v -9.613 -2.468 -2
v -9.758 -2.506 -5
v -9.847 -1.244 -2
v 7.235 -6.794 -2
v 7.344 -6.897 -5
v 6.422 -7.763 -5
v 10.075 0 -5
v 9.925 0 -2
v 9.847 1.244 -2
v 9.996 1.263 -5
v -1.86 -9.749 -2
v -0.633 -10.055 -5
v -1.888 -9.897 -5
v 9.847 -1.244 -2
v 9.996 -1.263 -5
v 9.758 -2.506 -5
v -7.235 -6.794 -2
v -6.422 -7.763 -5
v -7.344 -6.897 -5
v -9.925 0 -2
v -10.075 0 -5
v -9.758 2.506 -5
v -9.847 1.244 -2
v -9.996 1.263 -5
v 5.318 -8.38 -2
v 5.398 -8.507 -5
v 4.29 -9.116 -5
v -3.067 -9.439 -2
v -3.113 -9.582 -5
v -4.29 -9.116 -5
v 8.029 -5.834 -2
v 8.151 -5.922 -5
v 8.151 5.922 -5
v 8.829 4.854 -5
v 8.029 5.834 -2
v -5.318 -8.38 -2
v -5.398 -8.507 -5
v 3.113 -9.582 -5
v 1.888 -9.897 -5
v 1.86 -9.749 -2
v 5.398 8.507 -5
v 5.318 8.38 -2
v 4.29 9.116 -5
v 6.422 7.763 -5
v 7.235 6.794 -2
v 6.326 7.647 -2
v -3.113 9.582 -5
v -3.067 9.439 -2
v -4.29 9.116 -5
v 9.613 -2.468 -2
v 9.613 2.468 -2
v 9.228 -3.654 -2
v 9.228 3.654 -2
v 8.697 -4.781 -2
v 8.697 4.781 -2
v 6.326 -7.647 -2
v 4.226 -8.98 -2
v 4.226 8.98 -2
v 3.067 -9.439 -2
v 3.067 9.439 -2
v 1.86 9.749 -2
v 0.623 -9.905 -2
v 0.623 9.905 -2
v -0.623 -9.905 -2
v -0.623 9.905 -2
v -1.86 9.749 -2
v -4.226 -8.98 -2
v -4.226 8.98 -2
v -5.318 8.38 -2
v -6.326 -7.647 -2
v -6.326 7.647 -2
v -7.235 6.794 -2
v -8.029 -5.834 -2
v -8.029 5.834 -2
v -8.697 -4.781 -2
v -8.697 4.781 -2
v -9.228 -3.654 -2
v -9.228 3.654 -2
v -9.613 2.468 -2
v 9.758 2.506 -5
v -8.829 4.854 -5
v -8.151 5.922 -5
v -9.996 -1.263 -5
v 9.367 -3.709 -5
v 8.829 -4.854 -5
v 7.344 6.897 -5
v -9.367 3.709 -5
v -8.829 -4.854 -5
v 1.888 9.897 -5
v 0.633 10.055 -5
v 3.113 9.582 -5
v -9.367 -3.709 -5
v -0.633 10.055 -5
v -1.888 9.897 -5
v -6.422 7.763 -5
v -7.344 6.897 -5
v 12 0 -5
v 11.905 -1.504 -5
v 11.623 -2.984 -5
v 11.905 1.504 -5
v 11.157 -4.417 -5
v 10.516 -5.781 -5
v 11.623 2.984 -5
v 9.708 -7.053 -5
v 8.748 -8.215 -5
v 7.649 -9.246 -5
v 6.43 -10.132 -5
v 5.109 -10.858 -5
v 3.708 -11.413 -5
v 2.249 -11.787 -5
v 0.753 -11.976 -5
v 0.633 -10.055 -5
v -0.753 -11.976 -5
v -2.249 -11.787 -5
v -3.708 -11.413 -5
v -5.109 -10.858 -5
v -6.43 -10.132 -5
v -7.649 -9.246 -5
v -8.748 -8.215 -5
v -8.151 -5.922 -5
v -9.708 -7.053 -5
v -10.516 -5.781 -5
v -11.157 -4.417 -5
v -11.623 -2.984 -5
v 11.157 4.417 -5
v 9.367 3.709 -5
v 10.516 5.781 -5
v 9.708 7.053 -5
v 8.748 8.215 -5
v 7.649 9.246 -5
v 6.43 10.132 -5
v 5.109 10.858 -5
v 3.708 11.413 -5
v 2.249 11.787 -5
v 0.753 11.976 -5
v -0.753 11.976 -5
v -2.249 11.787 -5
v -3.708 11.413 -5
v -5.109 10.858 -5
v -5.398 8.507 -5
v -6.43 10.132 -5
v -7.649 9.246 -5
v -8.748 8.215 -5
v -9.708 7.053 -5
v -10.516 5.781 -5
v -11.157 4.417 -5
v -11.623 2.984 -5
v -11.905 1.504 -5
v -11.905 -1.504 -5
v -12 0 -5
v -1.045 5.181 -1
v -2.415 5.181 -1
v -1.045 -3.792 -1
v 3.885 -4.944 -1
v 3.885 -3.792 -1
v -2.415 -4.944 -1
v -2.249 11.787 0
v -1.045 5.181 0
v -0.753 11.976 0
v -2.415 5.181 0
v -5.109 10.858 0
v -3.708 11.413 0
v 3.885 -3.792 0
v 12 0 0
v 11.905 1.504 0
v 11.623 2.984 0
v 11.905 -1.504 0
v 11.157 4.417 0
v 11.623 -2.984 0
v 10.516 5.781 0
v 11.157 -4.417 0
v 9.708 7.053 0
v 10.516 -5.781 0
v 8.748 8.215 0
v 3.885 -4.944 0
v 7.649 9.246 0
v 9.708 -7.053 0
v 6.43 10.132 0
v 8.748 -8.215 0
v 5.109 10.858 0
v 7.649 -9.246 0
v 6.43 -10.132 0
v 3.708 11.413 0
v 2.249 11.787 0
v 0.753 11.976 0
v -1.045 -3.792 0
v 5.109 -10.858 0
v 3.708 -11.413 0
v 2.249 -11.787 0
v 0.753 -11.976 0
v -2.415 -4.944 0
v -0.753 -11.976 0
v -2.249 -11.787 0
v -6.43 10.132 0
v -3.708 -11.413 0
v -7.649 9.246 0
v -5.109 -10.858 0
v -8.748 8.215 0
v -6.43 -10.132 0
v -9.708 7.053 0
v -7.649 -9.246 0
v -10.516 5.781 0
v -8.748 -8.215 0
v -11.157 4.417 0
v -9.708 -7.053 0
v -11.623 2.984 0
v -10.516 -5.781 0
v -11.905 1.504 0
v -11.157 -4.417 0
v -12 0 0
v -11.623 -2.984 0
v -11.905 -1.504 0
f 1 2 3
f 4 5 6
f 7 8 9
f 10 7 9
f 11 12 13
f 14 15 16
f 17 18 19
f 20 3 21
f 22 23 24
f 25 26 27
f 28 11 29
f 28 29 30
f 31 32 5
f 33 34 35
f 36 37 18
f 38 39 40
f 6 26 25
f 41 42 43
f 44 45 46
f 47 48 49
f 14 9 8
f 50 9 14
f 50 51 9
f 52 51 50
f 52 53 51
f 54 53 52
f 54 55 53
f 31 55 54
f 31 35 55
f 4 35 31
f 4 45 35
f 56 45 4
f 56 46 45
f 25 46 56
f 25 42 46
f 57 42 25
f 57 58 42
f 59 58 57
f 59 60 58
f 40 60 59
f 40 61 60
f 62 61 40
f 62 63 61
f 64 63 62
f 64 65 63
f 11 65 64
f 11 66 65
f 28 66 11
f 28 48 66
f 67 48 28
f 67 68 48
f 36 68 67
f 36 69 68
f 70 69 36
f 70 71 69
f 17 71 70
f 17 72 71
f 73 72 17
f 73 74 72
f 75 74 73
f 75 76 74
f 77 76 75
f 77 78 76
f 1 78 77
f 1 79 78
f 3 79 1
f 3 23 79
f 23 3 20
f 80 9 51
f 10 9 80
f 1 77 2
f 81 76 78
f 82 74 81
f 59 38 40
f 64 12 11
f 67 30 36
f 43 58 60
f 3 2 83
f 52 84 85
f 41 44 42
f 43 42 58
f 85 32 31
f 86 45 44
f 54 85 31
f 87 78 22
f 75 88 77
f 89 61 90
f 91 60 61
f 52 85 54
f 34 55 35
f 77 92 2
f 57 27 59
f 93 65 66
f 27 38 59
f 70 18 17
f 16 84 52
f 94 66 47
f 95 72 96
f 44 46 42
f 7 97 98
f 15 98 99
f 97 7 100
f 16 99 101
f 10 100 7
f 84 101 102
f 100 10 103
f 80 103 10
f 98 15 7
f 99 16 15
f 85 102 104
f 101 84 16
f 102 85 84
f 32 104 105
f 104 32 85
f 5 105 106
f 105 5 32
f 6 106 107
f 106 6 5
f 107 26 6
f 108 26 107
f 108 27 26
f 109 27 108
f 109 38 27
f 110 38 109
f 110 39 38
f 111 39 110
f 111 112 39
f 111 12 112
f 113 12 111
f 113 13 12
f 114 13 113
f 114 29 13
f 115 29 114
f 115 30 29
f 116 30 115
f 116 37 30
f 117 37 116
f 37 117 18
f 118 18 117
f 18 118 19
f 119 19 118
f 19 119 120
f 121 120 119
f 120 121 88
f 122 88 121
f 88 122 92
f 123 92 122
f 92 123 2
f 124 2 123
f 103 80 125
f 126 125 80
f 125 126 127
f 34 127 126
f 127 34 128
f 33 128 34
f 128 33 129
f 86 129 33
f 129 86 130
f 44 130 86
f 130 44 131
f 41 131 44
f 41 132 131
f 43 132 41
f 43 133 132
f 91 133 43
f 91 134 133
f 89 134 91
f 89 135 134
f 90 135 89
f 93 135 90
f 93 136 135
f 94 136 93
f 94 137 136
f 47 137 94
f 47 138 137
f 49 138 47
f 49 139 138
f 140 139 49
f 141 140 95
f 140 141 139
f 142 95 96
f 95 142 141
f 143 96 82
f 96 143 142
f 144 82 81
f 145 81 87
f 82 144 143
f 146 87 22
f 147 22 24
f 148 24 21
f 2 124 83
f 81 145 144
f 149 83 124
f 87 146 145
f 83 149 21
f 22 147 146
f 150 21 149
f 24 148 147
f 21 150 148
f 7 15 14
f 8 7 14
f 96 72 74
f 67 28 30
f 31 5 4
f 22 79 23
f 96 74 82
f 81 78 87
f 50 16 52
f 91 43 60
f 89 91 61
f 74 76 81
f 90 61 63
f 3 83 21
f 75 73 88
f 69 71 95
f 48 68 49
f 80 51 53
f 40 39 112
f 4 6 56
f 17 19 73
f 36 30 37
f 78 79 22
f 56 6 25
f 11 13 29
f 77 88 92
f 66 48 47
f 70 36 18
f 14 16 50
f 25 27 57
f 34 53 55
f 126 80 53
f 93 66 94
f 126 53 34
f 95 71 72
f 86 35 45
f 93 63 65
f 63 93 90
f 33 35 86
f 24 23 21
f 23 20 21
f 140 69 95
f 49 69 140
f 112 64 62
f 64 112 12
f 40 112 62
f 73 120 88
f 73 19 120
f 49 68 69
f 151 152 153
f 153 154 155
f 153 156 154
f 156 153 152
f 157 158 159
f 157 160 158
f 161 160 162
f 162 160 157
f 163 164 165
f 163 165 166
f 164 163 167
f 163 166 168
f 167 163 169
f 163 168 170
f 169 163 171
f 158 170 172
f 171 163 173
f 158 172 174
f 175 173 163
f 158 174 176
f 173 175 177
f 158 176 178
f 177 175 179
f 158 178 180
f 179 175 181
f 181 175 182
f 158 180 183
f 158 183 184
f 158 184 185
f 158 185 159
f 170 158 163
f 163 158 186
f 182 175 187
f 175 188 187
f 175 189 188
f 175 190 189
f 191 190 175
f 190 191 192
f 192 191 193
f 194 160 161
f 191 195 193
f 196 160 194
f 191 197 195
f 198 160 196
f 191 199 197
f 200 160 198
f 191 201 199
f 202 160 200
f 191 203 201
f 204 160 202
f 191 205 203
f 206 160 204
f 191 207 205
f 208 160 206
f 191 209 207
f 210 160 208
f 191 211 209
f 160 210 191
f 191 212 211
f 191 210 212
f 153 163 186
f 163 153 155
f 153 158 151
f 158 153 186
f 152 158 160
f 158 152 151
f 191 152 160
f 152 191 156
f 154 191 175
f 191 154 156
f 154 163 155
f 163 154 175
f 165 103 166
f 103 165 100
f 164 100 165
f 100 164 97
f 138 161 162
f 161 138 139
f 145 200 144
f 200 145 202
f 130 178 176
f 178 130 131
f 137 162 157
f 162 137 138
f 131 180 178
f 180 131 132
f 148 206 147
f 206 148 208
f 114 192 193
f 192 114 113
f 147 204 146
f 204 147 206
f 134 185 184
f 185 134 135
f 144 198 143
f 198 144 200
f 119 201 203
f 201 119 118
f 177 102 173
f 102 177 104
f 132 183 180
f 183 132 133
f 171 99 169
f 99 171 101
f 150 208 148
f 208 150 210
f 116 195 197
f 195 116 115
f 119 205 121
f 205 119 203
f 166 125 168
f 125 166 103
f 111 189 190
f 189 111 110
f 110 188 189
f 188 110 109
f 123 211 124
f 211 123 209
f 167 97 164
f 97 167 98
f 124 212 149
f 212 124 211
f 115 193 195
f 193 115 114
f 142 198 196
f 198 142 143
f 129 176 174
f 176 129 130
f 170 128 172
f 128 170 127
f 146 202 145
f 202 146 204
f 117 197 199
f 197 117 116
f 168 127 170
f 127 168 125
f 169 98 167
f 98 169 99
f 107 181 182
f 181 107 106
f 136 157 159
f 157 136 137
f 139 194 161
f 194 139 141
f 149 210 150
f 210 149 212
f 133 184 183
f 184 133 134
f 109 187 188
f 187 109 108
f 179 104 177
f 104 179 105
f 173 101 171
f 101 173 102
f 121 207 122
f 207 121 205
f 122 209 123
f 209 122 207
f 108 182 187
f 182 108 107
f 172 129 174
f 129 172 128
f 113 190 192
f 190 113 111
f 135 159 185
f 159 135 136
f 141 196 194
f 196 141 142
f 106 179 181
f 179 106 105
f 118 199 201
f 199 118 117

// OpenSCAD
$fn = 50;


difference() {
	union() {
		translate(v = [0, 0, -5.0000000000]) {
			cylinder(h = 5, r = 12.0000000000);
		}
	}
	union() {
		#translate(v = [0, 0, -5.0000000000]) {
			cylinder(h = 3, r1 = 10.0750000000, r2 = 9.9250000000);
		}
		translate(v = [0, 0, -1]) {
			linear_extrude(height = 1) {
				text(font = "Impact", halign = "center", size = 10, text = "L", valign = "center");
			}
		}
	}
}
